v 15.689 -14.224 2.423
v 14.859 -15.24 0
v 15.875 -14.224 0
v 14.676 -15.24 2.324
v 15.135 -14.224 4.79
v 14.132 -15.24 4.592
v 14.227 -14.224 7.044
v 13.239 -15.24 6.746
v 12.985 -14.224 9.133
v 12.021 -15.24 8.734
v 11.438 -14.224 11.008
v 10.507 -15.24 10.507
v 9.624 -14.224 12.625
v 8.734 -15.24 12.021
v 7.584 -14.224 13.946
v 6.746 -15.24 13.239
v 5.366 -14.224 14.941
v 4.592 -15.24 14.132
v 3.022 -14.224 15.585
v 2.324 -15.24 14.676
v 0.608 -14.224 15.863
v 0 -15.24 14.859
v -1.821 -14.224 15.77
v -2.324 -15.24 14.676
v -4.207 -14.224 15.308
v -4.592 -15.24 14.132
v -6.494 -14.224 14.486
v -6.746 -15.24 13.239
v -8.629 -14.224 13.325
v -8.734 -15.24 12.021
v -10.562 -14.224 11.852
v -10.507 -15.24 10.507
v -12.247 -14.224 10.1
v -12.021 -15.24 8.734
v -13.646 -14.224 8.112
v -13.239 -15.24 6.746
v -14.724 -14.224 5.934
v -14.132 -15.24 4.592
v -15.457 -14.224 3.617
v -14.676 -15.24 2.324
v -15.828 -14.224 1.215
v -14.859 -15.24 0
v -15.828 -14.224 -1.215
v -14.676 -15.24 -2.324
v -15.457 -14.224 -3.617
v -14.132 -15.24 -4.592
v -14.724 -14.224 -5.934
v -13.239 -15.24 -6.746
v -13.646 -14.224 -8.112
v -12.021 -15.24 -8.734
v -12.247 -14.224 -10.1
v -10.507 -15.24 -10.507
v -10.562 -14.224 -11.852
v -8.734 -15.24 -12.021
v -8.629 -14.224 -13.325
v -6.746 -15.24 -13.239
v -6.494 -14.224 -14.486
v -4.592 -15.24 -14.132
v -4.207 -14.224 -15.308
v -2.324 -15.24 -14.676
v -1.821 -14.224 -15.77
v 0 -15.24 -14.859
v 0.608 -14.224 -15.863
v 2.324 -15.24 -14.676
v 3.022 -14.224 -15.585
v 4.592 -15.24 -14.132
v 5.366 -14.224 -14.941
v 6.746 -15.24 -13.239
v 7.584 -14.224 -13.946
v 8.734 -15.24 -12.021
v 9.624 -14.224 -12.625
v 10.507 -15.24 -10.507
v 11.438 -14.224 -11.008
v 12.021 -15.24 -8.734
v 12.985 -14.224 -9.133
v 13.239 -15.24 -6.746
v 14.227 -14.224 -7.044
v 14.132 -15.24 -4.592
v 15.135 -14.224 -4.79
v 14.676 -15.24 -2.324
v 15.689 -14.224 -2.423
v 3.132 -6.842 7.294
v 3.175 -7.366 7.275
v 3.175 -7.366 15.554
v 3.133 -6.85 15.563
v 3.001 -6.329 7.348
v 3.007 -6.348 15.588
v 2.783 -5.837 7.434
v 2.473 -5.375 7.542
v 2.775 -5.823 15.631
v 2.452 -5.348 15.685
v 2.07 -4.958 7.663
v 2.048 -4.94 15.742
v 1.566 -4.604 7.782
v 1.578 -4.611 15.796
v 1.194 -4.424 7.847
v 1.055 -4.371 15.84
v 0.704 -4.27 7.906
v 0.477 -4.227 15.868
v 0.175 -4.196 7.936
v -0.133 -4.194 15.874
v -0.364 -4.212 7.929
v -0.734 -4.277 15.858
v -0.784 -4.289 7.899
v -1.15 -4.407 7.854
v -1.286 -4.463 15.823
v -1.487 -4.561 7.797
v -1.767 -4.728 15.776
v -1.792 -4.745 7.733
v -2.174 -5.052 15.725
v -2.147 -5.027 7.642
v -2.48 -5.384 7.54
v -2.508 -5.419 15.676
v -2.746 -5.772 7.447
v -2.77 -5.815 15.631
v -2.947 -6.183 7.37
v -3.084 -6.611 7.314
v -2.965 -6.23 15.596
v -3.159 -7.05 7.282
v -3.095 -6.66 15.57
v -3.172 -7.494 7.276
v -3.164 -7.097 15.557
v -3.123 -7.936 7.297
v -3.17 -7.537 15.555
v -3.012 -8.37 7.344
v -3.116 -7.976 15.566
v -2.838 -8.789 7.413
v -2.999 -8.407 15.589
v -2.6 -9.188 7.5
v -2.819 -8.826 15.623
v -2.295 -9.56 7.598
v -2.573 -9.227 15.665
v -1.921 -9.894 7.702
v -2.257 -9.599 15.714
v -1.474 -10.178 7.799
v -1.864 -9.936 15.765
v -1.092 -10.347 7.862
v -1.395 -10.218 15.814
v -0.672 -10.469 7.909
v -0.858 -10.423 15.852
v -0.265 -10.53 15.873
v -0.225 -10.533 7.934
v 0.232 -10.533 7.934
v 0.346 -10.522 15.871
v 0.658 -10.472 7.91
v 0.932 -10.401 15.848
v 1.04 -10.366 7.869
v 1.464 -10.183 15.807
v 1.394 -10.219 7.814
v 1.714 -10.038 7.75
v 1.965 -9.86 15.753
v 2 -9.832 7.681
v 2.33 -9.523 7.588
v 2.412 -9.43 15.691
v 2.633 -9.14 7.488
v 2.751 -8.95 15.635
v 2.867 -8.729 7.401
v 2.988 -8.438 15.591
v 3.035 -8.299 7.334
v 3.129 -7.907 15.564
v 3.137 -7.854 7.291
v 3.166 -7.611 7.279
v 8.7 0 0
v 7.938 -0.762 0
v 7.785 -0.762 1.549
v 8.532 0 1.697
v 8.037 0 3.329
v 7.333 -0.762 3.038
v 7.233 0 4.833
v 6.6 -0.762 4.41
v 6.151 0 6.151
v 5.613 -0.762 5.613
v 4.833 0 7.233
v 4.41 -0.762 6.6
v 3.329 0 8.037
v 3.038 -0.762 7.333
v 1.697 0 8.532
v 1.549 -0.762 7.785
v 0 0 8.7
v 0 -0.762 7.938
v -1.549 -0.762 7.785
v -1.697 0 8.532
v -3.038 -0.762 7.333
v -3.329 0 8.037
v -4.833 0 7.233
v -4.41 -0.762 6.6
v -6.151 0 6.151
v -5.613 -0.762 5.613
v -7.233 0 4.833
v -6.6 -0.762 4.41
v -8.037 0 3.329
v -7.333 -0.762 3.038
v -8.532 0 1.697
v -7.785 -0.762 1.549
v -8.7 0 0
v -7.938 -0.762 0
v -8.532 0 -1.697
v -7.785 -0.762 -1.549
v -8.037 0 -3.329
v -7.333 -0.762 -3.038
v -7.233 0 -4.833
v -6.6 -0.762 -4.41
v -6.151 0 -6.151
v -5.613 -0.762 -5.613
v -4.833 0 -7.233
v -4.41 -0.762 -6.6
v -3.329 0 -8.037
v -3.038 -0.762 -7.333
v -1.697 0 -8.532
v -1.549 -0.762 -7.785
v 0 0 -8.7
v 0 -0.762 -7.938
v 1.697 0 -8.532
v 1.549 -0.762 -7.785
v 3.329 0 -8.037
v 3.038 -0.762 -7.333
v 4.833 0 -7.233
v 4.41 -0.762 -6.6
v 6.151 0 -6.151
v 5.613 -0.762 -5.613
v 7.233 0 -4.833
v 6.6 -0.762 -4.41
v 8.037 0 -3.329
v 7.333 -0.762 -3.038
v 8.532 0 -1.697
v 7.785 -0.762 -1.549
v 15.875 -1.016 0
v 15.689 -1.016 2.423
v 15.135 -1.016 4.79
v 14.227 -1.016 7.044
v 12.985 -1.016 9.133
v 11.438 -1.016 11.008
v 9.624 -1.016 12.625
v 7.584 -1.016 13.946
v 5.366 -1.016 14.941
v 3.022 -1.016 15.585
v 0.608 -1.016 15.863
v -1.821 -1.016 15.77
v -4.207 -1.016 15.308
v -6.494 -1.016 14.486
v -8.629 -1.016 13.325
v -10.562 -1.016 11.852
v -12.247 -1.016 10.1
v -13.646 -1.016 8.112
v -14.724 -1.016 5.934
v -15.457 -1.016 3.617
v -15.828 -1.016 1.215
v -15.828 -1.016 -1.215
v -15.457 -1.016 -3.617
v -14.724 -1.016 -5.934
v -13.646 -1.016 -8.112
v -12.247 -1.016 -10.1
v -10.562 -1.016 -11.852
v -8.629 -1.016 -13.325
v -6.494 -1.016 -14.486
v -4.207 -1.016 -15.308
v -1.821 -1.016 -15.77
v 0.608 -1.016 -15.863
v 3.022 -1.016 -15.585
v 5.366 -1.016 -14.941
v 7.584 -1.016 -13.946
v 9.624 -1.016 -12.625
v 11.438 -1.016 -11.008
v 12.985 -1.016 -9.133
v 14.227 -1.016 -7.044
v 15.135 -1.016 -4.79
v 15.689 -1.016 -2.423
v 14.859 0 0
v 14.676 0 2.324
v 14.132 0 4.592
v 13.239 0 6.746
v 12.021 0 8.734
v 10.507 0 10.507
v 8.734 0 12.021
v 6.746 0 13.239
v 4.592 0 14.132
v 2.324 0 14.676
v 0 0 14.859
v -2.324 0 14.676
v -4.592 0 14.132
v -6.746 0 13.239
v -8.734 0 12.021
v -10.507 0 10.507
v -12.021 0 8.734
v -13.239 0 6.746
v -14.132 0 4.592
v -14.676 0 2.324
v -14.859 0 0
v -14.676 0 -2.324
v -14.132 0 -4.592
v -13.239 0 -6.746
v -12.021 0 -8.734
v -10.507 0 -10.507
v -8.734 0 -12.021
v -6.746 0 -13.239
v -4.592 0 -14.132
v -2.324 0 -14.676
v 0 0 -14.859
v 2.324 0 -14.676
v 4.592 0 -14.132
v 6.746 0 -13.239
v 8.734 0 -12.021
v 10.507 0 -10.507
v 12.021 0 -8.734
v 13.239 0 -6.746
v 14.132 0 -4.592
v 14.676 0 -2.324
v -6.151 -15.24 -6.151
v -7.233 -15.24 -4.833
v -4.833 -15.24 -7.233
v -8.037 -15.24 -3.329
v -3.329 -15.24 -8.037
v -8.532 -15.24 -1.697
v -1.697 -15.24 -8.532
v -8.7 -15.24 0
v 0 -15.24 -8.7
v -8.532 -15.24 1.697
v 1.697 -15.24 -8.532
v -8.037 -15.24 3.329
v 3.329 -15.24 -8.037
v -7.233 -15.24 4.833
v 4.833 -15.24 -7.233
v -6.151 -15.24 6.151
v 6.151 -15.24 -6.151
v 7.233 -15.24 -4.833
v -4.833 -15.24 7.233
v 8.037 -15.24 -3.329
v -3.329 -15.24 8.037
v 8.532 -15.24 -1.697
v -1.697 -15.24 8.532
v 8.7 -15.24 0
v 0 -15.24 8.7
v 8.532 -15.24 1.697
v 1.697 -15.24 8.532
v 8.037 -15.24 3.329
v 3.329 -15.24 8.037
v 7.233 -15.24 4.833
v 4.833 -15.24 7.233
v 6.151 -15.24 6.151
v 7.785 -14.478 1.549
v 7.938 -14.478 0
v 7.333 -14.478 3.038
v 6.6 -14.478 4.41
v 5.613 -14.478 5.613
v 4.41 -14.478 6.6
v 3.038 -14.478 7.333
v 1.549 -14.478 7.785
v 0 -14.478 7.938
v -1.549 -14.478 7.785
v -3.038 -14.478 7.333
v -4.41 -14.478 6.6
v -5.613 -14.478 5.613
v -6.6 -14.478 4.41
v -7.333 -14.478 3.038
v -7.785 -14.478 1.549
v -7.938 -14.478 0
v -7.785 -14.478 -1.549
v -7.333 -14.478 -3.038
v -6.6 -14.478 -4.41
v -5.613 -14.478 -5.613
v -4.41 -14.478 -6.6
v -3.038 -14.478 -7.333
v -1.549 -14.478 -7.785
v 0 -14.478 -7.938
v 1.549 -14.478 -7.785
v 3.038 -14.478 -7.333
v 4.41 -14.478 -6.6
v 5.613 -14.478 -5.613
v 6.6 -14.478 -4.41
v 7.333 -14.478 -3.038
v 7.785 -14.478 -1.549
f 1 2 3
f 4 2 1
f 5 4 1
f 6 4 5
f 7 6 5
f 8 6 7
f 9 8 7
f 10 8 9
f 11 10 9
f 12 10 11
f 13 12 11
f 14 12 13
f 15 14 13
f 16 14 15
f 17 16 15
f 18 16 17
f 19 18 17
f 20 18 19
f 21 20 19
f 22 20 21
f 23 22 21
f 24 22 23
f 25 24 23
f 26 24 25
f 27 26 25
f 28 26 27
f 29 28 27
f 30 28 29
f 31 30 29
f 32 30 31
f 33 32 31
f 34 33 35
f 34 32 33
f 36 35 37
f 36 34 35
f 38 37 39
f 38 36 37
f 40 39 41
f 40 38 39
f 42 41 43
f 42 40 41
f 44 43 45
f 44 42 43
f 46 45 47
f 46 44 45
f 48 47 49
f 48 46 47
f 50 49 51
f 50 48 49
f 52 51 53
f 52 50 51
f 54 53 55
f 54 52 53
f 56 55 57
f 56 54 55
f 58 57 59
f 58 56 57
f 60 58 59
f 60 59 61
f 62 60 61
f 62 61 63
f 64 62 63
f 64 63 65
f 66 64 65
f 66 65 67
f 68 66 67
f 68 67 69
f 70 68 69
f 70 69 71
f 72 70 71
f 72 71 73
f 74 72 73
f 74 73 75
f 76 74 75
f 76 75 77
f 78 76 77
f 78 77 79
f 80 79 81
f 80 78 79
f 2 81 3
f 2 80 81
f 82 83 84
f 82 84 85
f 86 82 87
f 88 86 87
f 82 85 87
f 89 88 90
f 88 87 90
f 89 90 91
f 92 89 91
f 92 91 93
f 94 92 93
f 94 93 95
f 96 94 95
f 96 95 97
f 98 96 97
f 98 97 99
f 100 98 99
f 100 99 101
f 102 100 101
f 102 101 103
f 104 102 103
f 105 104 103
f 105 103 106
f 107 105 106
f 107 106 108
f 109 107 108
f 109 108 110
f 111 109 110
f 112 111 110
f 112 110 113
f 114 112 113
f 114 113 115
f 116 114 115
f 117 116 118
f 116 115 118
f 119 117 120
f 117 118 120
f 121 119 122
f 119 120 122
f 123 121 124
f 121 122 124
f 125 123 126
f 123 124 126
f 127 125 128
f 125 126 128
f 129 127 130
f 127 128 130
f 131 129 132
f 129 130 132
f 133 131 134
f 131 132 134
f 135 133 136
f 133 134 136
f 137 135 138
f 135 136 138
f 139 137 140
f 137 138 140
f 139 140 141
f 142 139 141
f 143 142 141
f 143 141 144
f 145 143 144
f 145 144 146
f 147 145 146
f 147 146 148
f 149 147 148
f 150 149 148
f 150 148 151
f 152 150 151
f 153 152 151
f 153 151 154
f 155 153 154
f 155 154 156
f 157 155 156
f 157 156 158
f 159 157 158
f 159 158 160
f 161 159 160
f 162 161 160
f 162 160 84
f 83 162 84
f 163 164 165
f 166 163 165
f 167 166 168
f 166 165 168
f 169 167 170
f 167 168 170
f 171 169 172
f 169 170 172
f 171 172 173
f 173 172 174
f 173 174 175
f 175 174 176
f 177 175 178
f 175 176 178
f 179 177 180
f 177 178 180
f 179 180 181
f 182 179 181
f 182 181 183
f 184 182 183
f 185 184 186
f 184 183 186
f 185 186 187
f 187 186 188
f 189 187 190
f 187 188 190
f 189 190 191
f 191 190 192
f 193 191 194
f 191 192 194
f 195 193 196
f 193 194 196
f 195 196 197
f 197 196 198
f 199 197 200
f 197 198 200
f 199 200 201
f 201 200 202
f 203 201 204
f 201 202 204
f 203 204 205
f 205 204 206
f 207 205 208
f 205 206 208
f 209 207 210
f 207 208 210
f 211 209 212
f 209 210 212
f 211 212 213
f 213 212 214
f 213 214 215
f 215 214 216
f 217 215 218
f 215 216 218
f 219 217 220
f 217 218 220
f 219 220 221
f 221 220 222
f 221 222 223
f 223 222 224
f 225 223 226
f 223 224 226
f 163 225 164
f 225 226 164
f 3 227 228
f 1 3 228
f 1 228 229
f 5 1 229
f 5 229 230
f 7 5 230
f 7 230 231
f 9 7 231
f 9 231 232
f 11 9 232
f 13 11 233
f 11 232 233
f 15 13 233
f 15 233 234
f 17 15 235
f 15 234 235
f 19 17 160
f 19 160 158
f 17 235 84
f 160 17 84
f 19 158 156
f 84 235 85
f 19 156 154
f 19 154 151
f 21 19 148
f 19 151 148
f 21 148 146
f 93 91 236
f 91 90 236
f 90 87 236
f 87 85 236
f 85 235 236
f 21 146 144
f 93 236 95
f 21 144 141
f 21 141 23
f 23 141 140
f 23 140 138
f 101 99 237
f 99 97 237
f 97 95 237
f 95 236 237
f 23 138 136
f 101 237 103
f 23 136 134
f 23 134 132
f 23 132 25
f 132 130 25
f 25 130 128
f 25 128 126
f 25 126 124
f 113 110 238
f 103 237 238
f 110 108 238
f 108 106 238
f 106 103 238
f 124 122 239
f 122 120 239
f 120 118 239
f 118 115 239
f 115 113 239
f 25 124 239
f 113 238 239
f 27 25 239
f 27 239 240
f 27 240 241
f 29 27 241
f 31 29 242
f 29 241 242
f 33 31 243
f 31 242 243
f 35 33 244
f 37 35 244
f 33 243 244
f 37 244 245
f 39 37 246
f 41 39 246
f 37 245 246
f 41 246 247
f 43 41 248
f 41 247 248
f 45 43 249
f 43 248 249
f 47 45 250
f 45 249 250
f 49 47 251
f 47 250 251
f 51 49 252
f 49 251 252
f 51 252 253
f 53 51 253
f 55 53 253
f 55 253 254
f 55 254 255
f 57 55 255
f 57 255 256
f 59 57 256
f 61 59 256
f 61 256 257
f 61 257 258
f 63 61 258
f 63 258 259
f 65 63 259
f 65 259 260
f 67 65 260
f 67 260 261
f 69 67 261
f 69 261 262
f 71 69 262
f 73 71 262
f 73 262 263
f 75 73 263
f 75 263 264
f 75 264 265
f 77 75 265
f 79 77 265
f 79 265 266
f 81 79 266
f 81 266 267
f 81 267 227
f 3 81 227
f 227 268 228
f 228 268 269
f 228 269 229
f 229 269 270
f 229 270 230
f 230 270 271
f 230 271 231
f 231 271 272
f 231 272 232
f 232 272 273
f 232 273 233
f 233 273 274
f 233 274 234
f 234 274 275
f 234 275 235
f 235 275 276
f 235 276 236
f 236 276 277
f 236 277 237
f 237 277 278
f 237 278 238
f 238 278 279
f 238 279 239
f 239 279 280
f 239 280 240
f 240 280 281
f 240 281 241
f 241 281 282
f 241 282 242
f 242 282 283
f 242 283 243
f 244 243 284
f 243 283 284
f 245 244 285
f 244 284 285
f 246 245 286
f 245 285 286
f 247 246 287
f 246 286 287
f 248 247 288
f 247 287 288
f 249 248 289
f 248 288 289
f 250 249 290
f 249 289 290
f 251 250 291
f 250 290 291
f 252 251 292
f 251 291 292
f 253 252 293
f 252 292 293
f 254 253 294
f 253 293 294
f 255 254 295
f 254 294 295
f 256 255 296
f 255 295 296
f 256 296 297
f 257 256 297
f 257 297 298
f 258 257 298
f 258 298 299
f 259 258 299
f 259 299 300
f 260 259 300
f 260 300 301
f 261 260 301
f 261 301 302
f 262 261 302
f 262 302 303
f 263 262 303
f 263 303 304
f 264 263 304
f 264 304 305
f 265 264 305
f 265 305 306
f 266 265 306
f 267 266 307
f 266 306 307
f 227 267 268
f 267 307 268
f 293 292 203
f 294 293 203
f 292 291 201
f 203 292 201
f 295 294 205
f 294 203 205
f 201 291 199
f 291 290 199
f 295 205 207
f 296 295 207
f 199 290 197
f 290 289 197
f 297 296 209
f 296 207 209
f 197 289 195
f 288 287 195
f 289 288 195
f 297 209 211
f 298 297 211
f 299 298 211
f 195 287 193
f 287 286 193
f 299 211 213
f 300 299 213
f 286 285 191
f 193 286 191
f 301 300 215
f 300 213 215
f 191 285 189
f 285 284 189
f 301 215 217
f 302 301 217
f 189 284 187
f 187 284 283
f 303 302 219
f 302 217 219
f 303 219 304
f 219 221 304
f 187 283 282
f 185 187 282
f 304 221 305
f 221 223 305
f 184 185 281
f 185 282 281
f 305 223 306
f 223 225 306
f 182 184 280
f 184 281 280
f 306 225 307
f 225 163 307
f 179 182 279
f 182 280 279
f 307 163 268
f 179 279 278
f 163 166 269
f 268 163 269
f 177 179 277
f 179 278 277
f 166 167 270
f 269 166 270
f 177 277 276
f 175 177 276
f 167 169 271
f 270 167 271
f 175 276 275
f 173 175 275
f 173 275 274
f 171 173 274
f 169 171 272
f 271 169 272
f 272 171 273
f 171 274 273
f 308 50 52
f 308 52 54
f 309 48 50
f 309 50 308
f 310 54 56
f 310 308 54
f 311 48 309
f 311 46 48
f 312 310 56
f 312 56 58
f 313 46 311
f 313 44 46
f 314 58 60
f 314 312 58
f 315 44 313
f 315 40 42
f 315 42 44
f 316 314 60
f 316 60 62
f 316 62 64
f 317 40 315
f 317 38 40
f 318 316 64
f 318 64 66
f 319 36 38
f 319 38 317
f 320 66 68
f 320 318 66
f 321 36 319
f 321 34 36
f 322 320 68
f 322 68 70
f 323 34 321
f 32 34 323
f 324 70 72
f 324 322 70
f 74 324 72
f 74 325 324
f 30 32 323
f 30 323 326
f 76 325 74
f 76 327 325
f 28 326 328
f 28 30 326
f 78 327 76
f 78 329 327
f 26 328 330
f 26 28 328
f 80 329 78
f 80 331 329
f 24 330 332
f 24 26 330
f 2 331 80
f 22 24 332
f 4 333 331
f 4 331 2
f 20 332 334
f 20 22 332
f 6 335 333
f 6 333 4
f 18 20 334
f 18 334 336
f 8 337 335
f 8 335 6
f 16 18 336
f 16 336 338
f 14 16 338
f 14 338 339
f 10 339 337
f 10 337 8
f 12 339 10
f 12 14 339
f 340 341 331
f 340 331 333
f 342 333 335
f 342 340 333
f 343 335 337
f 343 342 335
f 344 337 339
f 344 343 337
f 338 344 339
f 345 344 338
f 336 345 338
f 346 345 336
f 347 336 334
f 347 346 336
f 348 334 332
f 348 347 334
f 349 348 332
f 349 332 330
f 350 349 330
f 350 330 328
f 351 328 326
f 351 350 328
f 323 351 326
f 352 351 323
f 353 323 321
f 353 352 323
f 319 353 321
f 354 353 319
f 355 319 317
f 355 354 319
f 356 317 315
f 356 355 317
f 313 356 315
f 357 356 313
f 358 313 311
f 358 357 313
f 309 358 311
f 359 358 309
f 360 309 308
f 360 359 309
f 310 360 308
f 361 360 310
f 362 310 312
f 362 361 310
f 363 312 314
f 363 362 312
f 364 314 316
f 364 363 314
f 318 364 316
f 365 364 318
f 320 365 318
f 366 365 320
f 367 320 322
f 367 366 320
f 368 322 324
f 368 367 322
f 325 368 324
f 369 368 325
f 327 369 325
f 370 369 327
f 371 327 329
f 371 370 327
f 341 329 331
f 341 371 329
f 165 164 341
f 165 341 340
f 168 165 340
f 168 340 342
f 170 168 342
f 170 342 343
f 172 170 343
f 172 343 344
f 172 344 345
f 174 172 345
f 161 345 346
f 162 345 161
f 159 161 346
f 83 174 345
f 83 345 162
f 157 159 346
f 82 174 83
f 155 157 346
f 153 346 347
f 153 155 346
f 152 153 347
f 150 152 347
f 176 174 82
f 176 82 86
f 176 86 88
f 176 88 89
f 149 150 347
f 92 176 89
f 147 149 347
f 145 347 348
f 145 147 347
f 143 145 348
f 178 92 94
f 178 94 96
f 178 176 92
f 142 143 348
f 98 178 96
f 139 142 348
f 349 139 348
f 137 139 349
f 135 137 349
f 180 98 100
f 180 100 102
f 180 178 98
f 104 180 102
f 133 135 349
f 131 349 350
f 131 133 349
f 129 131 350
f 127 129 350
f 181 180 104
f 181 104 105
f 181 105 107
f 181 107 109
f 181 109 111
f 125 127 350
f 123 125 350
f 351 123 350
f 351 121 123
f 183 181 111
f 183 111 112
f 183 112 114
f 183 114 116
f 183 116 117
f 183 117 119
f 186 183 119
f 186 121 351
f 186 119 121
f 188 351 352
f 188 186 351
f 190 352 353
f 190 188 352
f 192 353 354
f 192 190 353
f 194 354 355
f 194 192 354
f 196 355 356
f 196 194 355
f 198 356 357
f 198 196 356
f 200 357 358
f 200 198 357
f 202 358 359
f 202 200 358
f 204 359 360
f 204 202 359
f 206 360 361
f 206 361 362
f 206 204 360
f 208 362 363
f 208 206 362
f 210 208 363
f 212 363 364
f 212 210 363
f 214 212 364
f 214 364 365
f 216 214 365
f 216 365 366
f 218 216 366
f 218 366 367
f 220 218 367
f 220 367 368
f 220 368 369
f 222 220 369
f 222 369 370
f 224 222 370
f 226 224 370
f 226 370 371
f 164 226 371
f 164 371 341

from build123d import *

# Parameters (mm, degrees)
F0_R     = 15.875
F0_R_2   = 7.9375
F1_DEPTH = 15.24
F2_SIZE  = 1.016
F3_SIZE  = 0.762
F5_R     = 3.175
F6_DEPTH = 14.224


with BuildPart() as f1:
    # F0 (on Front) → F1 (new body)
    with BuildSketch(Plane.XZ):
        Circle(F0_R)
        Circle(F0_R_2, mode=Mode.SUBTRACT)
    extrude(amount=F1_DEPTH)

    # F2
    f2_edges = [f1.edges().sort_by_distance(p)[0] for p in [
        (-15.875, -15.24, 0),
        (-15.875, 0, 0),
    ]]
    chamfer(f2_edges, length=F2_SIZE)

    # F3
    f3_edges = [f1.edges().sort_by_distance(p)[0] for p in [
        (-7.9375, -15.24, 0),
        (-7.9375, 0, 0),
    ]]
    chamfer(f3_edges, length=F3_SIZE)

    # F5 (on offset) → F6 (cut)
    with BuildSketch(Plane.XY.offset(15.875)):
        with Locations((0, -7.366)):
            Circle(F5_R)
    extrude(amount=-F6_DEPTH, mode=Mode.SUBTRACT)


solid = f1.part
